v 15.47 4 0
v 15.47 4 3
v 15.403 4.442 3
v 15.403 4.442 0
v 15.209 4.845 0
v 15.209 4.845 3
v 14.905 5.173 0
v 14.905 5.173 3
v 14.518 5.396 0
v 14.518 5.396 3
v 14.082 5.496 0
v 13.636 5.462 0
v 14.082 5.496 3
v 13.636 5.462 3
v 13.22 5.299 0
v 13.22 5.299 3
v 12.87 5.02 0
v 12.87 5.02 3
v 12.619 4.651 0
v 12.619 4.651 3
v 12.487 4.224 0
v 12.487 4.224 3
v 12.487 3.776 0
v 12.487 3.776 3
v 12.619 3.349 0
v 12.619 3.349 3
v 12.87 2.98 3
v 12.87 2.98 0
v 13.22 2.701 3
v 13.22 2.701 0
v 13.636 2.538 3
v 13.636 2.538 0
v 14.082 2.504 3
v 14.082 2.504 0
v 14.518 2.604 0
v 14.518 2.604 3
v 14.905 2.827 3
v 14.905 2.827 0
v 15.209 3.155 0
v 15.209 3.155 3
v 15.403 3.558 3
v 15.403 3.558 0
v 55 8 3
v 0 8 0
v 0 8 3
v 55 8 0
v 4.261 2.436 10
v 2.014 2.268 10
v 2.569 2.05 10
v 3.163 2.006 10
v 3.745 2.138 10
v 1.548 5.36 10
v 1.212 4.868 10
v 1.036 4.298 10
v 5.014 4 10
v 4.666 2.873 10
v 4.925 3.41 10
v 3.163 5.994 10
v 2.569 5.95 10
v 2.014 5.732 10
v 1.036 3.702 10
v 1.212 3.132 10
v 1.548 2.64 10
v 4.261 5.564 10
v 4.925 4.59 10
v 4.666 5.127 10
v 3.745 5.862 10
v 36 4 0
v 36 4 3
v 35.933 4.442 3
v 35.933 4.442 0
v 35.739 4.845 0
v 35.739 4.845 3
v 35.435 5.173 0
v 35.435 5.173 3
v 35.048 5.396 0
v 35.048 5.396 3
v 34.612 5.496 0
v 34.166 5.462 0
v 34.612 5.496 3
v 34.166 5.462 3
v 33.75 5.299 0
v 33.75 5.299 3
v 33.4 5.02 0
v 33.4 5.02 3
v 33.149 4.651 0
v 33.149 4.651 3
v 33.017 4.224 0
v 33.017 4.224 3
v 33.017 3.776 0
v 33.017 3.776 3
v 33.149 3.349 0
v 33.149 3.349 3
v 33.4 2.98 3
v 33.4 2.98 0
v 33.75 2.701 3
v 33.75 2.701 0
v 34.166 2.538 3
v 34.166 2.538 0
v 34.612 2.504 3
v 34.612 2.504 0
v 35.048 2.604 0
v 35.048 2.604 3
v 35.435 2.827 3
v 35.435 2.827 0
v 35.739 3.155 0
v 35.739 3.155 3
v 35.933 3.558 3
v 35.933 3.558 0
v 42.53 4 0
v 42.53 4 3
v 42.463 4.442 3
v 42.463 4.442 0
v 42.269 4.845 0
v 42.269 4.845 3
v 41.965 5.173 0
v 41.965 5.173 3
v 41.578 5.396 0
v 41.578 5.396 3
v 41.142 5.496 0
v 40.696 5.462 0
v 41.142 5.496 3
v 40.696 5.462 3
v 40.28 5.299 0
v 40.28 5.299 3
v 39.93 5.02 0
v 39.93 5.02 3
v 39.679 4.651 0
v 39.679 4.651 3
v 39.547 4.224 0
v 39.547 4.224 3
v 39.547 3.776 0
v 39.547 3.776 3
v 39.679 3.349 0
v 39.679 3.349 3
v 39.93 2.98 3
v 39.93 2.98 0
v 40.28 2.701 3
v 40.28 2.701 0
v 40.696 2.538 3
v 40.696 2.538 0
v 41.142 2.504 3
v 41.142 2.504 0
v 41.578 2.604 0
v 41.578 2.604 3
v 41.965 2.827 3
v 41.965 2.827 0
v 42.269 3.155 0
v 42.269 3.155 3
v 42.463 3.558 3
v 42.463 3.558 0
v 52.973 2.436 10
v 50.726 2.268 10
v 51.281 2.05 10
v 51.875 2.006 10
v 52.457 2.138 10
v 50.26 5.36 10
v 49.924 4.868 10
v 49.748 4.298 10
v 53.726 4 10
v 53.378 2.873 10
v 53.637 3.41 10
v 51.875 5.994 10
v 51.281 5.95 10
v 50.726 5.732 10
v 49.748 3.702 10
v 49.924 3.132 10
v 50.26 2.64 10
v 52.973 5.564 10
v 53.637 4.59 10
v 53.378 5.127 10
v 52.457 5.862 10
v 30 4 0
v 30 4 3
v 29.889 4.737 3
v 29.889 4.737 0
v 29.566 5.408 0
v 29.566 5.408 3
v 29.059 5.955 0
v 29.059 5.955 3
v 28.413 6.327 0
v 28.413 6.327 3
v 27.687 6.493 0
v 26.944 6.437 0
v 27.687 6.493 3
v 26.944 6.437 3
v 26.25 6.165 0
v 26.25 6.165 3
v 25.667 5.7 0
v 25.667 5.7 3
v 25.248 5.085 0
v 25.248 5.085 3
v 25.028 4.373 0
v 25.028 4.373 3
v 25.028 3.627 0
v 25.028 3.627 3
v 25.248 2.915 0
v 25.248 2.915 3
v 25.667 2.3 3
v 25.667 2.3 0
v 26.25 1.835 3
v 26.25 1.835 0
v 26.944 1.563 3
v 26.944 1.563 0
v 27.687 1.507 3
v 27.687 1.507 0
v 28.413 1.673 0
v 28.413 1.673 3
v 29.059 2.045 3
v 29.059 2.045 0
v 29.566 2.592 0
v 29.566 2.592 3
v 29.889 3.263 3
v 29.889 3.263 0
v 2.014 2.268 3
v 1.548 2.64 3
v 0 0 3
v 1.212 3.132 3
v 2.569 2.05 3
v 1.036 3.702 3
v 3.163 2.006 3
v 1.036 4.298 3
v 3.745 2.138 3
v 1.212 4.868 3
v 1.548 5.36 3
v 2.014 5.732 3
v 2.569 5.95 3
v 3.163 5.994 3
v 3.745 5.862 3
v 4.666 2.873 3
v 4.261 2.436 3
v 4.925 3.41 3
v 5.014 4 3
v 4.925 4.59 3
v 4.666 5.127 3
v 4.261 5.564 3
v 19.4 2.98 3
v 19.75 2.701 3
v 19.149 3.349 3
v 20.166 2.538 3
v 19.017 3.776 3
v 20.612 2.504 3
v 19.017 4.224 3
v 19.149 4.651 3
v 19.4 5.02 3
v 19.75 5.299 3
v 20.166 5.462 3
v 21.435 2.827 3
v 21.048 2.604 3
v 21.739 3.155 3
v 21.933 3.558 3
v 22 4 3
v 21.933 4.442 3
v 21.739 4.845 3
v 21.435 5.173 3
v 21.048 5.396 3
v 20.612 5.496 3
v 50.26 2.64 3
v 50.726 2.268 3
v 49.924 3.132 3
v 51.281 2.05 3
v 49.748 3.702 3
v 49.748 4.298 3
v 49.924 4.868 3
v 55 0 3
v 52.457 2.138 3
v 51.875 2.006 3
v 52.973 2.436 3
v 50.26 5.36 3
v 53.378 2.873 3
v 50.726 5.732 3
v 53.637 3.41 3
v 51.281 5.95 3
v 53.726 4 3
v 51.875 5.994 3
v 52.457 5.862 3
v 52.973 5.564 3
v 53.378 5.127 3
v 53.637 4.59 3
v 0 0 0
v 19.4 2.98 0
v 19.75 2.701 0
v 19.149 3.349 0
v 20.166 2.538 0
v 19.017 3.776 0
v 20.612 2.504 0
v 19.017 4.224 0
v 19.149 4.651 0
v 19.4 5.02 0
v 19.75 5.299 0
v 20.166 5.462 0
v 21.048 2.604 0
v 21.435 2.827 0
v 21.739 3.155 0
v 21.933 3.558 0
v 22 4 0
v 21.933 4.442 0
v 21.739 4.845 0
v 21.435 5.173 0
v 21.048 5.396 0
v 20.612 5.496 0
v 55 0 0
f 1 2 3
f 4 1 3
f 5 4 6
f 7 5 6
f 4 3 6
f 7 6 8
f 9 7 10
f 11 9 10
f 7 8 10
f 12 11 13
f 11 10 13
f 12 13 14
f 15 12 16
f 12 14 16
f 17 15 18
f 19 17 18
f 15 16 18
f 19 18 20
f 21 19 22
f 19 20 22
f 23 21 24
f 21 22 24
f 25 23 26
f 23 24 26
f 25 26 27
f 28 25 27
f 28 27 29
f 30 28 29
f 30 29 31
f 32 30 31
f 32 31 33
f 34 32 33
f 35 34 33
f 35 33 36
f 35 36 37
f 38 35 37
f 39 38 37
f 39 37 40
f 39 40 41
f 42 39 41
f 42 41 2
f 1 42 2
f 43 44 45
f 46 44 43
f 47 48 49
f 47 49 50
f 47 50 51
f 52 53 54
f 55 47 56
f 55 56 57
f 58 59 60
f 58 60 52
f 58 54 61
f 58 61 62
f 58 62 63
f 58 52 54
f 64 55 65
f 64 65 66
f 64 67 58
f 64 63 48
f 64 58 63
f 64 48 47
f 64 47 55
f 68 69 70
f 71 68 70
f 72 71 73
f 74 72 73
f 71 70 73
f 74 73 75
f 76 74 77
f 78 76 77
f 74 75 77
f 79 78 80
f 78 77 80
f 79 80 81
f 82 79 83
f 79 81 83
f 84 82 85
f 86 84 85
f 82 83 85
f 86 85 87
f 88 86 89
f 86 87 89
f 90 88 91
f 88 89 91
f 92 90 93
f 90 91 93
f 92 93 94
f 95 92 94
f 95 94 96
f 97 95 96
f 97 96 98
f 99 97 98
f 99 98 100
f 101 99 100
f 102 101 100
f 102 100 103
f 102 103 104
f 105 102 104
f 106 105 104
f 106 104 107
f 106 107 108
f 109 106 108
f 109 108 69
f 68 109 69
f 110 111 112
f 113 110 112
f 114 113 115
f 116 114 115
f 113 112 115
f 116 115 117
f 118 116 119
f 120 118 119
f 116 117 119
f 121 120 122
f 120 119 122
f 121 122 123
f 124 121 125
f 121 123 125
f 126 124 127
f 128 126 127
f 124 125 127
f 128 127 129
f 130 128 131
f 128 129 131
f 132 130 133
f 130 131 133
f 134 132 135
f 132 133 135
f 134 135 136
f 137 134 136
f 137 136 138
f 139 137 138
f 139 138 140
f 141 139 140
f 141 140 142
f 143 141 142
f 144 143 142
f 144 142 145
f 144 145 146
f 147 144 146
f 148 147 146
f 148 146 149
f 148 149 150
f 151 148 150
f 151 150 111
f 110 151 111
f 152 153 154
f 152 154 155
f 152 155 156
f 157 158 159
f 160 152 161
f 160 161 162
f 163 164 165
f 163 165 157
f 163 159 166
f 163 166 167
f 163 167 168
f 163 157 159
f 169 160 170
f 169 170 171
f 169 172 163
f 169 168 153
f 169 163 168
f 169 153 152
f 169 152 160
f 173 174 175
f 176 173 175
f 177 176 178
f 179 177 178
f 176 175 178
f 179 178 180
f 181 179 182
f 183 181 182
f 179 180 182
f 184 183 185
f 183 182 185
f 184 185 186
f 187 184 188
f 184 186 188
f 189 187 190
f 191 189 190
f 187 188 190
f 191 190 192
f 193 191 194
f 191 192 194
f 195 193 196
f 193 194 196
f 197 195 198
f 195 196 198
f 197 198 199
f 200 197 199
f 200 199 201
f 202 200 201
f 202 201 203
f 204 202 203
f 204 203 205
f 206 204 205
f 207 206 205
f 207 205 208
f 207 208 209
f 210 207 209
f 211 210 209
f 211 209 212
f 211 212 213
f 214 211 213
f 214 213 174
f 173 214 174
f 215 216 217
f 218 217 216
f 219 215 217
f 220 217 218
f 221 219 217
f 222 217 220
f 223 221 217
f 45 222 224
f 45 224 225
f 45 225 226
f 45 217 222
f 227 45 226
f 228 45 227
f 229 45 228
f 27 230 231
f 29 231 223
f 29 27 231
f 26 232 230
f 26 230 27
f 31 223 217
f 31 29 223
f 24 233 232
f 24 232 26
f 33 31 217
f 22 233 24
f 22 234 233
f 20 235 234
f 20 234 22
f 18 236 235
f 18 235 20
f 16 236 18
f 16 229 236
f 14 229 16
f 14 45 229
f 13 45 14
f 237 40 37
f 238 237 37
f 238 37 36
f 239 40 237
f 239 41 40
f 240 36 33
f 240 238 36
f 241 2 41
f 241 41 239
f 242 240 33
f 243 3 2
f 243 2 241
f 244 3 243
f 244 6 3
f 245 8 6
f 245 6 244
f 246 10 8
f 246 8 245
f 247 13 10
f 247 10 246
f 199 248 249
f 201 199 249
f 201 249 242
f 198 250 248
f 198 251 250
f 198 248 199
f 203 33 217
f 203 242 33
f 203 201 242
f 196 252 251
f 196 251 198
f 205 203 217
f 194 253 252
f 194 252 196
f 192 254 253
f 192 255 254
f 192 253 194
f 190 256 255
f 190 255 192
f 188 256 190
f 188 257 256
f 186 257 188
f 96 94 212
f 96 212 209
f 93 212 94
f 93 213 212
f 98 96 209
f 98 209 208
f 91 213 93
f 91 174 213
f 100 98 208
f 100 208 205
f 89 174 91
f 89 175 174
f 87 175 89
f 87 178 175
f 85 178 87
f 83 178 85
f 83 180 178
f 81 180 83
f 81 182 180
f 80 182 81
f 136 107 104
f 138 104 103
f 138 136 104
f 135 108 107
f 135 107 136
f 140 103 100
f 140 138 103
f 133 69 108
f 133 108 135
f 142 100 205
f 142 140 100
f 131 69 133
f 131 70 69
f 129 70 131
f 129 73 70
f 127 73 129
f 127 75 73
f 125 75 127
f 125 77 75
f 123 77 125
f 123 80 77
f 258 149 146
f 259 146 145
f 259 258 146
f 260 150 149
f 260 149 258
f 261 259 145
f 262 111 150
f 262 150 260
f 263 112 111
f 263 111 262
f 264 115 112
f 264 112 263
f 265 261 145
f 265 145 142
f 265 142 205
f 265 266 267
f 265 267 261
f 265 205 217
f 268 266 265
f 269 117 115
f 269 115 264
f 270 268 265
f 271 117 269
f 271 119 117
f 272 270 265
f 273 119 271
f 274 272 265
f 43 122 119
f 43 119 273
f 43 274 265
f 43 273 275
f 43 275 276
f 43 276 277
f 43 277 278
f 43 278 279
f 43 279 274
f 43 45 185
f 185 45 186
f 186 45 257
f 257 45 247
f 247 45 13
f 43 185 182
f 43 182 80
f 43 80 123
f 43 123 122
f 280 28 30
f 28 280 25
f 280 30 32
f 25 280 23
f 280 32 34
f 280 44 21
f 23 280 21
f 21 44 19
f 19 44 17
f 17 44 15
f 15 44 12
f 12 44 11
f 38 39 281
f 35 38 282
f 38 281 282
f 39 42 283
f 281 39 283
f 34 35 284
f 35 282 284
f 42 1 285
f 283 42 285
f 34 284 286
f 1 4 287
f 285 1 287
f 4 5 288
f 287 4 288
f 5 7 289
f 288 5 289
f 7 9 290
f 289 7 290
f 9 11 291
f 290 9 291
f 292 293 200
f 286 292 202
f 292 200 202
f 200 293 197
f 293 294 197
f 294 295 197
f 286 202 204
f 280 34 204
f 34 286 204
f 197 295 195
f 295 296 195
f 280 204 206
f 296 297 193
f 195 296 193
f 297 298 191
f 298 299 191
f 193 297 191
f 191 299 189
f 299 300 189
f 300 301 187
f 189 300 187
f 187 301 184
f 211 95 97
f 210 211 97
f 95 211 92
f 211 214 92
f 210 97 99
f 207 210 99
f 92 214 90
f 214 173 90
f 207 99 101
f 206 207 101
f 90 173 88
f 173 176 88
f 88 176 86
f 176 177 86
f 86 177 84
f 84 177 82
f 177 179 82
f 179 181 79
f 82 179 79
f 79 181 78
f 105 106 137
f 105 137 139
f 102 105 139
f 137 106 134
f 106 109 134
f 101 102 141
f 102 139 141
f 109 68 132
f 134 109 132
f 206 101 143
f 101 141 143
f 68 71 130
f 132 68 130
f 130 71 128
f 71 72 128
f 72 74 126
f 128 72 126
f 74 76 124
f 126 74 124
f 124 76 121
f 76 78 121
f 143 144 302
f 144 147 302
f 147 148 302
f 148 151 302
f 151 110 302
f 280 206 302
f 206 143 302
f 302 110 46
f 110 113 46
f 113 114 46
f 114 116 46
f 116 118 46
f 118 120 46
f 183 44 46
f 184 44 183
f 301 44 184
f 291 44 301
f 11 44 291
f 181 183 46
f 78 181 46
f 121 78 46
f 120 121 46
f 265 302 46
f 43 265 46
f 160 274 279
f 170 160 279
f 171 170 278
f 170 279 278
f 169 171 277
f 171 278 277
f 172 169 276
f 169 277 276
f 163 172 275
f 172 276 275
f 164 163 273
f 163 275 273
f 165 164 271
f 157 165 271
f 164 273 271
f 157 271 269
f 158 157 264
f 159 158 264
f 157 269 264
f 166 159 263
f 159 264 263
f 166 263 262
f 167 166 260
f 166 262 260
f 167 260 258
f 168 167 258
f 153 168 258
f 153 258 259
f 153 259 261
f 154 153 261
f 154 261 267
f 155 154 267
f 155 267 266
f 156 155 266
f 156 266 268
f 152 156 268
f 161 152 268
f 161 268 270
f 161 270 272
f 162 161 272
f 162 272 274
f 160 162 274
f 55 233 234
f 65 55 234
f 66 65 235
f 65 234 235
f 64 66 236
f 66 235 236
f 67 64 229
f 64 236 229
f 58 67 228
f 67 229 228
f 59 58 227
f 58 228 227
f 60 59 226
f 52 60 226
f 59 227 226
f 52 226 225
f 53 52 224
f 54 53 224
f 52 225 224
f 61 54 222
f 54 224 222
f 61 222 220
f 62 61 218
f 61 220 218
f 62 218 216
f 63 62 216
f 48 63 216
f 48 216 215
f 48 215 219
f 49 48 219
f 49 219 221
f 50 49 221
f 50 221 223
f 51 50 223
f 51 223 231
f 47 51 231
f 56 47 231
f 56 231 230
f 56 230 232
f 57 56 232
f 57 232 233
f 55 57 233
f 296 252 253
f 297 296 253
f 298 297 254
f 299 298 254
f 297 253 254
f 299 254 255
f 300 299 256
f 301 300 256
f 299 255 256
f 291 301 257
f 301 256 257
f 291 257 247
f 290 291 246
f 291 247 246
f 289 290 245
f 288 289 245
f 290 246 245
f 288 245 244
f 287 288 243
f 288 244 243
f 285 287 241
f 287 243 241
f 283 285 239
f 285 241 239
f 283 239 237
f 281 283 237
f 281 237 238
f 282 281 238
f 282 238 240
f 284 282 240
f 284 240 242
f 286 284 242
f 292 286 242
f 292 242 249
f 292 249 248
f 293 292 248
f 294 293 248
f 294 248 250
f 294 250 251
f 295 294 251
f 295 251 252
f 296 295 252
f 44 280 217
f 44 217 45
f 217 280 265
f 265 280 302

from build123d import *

# Parameters (mm, degrees)
SKETCH1_W           = 55
SKETCH1_H           = 8
BOSS_EXTRUDE1_DEPTH = 3
SKETCH2_R           = 1.5
SKETCH2_R_2         = 2.5
CUT_EXTRUDE1_DEPTH  = 4
SKETCH3_R           = 2
BOSS_EXTRUDE2_DEPTH = 10


with BuildPart() as part:
    # Sketch1 → Boss-Extrude1 (new body)
    with BuildSketch(Plane.XY):
        with Locations((27.5, 4)):
            Rectangle(SKETCH1_W, SKETCH1_H)
    extrude(amount=BOSS_EXTRUDE1_DEPTH)

    # Sketch2 → Cut-Extrude1 (cut, through all)
    with BuildSketch(Plane.XY.offset(3)):
        with Locations((13.97, 4)):
            Circle(SKETCH2_R)
        with Locations((20.5, 4)):
            Circle(SKETCH2_R)
        with Locations((41.03, 4)):
            Circle(SKETCH2_R)
        with Locations((34.5, 4)):
            Circle(SKETCH2_R)
        with Locations((27.5, 4)):
            Circle(SKETCH2_R_2)
    extrude(amount=-CUT_EXTRUDE1_DEPTH, mode=Mode.SUBTRACT)

    # Sketch3 → Boss-Extrude2 (add)
    with BuildSketch(Plane.XY):
        with Locations((51.725977791, 4)):
            Circle(SKETCH3_R)
        with Locations((3.013958935, 4)):
            Circle(SKETCH3_R)
    extrude(amount=BOSS_EXTRUDE2_DEPTH)


solid = part.part
